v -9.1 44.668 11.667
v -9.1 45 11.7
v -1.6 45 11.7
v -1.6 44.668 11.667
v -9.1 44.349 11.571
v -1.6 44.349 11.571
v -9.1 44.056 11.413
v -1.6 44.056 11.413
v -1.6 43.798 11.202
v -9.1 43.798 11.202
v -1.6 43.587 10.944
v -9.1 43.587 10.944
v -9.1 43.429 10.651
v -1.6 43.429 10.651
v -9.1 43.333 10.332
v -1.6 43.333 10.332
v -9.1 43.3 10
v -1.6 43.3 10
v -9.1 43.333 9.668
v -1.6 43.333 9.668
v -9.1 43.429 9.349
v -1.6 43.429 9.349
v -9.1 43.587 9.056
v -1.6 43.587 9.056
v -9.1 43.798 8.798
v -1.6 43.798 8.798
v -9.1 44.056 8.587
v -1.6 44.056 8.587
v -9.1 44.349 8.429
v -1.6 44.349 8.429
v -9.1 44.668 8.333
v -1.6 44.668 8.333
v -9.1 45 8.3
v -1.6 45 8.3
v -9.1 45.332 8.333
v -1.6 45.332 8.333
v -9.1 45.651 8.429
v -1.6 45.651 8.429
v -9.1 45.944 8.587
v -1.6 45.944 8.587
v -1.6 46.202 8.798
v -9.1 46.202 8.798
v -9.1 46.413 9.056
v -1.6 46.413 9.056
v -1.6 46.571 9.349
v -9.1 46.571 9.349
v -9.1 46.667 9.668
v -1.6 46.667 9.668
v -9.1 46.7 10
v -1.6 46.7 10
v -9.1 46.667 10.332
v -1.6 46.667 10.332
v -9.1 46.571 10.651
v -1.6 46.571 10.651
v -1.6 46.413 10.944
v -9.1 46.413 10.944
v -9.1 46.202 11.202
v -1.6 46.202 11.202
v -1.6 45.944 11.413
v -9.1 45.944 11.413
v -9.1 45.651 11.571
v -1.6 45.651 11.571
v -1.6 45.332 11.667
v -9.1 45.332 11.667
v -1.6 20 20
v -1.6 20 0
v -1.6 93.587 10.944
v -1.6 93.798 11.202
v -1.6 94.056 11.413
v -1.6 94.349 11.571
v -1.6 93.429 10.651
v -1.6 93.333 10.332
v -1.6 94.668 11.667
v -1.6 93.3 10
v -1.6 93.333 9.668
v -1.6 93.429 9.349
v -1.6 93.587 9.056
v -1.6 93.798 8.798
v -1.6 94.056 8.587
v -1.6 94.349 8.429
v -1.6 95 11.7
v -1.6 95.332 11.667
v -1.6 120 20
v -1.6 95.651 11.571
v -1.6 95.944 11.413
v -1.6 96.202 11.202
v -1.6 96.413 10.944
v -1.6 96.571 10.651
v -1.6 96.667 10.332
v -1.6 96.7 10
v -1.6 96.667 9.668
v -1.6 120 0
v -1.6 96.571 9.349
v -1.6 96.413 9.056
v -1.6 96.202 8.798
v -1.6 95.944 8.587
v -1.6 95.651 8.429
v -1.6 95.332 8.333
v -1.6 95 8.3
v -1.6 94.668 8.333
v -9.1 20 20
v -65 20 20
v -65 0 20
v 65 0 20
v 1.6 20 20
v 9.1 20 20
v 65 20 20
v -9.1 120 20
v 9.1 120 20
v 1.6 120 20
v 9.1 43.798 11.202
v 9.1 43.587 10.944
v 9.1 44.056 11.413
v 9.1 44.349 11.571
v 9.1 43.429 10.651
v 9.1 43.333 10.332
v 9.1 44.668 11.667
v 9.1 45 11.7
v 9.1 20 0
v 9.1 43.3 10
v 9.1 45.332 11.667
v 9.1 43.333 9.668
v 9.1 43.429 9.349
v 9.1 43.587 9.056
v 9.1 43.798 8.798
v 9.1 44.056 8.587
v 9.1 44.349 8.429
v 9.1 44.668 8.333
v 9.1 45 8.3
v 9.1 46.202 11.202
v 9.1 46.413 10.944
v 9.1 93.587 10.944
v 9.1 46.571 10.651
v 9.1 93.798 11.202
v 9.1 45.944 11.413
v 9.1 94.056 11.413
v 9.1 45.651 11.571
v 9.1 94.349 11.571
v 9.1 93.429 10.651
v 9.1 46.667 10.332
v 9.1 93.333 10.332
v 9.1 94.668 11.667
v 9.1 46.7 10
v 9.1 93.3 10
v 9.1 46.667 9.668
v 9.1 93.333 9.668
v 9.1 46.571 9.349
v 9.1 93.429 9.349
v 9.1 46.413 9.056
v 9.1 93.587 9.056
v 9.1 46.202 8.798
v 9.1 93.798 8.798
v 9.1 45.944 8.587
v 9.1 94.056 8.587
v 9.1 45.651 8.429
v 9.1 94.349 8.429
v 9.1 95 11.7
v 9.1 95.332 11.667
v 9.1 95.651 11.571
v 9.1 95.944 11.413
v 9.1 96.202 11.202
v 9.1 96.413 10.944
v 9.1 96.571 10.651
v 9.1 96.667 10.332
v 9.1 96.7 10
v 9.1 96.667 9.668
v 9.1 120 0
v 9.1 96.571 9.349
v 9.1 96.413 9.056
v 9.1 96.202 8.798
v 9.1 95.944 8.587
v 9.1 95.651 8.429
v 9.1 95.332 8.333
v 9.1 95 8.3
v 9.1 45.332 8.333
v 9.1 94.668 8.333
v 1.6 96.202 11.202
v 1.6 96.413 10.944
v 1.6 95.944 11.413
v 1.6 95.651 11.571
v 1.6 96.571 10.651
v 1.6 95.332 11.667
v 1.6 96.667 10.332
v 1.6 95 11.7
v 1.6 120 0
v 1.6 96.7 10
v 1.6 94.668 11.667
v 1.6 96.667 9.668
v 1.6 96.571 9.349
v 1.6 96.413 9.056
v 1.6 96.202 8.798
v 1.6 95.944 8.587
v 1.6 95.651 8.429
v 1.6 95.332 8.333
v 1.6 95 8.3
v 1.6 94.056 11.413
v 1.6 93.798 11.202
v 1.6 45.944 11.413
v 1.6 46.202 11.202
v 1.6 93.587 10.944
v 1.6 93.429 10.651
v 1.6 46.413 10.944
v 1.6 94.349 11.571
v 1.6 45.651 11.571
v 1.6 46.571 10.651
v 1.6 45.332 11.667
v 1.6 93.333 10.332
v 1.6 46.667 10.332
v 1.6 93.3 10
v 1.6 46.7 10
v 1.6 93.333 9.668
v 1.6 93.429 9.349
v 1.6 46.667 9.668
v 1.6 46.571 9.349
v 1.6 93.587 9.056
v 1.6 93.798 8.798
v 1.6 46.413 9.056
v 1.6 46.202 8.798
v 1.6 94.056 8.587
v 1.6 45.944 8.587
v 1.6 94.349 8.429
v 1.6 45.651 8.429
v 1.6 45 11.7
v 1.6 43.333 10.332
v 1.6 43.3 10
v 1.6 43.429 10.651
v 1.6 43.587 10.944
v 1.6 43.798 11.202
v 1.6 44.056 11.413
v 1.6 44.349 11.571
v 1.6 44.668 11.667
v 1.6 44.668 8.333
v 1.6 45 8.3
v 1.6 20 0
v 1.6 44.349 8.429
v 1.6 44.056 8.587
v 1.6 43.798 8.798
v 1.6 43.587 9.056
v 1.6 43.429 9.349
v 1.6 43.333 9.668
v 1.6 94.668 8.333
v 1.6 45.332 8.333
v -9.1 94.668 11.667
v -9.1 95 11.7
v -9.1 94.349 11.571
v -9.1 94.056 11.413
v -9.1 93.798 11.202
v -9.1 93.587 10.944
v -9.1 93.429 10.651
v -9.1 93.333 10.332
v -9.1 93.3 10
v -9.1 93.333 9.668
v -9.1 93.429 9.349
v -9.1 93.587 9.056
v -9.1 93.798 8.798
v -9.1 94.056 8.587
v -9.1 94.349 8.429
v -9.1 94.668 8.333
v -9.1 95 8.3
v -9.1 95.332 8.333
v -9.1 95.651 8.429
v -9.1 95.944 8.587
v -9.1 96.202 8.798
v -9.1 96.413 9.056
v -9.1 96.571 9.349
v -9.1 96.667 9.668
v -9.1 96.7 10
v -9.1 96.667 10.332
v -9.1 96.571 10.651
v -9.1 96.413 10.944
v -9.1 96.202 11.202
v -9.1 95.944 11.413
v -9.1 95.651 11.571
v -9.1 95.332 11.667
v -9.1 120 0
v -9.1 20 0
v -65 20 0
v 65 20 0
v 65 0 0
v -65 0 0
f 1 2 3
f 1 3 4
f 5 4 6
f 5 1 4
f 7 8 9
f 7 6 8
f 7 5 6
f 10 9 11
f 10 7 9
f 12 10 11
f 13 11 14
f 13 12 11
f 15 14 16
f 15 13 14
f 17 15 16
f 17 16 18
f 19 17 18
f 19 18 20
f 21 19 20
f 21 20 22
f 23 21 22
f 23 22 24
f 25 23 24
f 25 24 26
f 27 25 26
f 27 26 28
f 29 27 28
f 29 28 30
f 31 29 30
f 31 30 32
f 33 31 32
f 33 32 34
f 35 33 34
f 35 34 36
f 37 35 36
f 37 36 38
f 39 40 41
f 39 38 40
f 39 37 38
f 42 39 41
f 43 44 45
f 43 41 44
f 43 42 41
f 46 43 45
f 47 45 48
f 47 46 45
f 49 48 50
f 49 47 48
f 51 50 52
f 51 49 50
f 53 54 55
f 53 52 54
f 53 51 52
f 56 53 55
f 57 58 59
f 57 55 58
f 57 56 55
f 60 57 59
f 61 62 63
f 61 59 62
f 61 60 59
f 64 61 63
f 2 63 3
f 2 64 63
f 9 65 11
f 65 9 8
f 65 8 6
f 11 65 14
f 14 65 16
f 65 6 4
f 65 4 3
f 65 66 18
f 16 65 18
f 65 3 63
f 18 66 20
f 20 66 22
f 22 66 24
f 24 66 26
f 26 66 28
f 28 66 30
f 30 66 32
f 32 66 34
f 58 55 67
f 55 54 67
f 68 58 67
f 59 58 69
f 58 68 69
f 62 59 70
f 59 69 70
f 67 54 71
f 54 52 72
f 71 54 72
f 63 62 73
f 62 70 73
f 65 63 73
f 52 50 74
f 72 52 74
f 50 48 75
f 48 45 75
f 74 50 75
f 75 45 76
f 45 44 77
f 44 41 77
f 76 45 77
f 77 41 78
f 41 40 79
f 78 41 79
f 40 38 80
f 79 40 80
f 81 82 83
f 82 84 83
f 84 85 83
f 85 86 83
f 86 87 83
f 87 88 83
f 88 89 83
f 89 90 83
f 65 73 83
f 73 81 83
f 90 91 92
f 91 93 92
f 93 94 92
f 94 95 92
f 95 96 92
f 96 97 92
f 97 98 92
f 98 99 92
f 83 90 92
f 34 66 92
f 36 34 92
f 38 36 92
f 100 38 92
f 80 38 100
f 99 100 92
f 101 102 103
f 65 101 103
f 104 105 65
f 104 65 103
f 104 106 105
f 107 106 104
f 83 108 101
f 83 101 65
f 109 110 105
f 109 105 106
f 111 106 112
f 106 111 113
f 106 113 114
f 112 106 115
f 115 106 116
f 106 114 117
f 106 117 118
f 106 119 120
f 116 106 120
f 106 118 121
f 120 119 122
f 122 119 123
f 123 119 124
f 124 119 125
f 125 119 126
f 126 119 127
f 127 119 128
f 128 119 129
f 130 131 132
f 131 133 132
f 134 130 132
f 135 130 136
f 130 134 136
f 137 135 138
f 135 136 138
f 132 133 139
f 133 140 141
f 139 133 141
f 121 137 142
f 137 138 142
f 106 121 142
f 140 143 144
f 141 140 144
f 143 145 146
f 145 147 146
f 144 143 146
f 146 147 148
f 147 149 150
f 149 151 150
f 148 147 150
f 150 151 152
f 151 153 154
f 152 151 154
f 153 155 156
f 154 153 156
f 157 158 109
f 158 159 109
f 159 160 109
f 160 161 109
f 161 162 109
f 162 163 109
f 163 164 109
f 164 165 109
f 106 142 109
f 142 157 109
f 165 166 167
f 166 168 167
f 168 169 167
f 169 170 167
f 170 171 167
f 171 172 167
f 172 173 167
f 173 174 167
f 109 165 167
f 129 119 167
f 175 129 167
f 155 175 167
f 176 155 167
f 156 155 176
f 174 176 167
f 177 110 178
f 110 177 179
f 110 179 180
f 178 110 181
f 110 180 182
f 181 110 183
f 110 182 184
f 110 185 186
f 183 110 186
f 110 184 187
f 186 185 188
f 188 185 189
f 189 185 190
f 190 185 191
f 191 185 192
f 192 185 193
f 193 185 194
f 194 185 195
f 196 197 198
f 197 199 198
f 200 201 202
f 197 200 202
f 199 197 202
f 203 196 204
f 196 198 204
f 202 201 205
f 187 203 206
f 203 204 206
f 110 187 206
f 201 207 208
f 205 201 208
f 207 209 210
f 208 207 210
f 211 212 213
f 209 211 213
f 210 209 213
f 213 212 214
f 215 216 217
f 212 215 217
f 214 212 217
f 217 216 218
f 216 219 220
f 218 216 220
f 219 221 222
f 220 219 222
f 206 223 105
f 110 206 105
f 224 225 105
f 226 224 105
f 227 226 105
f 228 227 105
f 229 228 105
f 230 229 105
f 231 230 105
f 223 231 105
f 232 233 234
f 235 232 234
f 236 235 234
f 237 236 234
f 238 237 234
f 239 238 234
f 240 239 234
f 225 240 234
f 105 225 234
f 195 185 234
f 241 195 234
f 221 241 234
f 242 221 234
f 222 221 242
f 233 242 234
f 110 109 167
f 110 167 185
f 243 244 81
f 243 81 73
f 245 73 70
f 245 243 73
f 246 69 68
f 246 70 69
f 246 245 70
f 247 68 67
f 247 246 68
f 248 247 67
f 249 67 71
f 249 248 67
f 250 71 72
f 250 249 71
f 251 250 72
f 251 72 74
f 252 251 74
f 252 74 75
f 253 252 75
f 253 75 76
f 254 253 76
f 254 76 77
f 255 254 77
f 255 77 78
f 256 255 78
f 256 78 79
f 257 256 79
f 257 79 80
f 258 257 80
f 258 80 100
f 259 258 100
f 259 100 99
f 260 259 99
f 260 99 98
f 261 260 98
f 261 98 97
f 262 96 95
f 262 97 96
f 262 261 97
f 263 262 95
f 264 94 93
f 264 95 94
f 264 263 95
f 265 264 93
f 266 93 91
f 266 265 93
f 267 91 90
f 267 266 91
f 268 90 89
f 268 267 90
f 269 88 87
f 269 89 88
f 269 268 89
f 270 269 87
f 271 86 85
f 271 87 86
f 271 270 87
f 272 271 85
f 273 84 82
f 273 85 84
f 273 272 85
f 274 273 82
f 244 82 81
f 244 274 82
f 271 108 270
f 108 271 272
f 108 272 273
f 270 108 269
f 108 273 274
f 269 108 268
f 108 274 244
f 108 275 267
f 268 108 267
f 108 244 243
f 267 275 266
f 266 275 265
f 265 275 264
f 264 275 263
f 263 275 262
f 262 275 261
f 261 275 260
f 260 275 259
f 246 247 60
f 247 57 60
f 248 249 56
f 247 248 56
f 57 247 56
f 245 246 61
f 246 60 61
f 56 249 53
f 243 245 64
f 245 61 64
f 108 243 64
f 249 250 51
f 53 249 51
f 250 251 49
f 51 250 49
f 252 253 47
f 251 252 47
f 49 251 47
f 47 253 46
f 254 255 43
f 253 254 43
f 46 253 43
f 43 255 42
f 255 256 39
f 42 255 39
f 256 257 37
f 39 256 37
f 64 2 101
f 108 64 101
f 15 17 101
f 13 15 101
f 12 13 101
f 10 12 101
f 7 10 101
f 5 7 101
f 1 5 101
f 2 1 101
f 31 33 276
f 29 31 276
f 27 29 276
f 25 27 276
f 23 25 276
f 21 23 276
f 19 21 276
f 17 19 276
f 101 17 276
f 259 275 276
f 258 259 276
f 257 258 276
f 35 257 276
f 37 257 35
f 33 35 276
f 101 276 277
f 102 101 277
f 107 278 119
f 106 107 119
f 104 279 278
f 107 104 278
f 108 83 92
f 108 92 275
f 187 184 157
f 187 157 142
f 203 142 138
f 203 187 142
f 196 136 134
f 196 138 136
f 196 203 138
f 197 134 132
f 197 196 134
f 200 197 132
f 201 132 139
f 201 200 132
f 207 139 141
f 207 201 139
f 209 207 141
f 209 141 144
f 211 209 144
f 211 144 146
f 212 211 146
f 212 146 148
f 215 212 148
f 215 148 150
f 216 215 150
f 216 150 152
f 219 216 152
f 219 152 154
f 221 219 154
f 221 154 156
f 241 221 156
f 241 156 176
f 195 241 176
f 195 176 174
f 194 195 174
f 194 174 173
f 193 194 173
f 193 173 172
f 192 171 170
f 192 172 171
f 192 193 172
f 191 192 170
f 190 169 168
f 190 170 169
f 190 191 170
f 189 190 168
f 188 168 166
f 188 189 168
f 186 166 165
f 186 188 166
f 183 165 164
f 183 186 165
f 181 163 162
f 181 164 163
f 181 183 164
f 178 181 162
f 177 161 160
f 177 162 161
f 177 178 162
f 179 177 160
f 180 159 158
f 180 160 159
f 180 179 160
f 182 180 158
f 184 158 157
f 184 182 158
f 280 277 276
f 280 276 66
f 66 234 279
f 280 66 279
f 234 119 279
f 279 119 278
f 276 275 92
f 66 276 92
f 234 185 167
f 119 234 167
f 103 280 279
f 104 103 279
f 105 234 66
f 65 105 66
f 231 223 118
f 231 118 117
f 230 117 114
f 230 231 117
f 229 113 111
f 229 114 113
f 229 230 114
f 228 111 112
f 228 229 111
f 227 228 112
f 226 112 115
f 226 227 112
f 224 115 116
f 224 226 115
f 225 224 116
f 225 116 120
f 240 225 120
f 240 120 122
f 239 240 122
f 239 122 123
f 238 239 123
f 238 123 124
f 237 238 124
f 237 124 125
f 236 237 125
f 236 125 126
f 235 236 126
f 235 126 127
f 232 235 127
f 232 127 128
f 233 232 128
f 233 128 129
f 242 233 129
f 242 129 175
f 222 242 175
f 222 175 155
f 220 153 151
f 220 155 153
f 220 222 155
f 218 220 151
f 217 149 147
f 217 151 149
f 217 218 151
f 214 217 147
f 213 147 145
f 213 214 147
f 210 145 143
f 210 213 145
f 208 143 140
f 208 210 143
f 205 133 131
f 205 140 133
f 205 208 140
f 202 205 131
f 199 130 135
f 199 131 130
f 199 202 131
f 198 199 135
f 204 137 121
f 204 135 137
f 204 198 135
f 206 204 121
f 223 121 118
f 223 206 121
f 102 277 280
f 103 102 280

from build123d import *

# Parameters (mm, degrees)
BOSS_EXTRUDE3_DEPTH     = 20
CUT_EXTRUDE1_DEPTH      = 88
CUT_EXTRUDE1_DEPTH_BACK = 161
SKETCH3_R               = 1.7


with BuildPart() as part:
    # Sketch1 → Boss-Extrude3 (new body)
    with BuildSketch(Plane.XY):
        Polygon((0, 0), (65, 0), (65, 20), (9.1, 20), (9.1, 120), (1.6, 120), (1.6, 20), (-1.6, 20), (-1.6, 120), (-9.1, 120), (-9.1, 20), (-65, 20), (-65, 0), align=None)
    extrude(amount=BOSS_EXTRUDE3_DEPTH)

    # Sketch3 → Cut-Extrude1 (cut, two sides: drawn at the far end of the back side and taken through both)
    with BuildSketch(Plane(origin=(9.1, 0, 0), x_dir=(0, 0, -1), z_dir=(1, 0, 0)).offset(-CUT_EXTRUDE1_DEPTH_BACK)):
        with Locations(Location((-10, 95, 0), (0, 0, 180))):
            Circle(SKETCH3_R)
        with Locations(Location((-10, 45, 0), (0, 0, 180))):
            Circle(SKETCH3_R)
    extrude(amount=CUT_EXTRUDE1_DEPTH + CUT_EXTRUDE1_DEPTH_BACK, mode=Mode.SUBTRACT)


solid = part.part
